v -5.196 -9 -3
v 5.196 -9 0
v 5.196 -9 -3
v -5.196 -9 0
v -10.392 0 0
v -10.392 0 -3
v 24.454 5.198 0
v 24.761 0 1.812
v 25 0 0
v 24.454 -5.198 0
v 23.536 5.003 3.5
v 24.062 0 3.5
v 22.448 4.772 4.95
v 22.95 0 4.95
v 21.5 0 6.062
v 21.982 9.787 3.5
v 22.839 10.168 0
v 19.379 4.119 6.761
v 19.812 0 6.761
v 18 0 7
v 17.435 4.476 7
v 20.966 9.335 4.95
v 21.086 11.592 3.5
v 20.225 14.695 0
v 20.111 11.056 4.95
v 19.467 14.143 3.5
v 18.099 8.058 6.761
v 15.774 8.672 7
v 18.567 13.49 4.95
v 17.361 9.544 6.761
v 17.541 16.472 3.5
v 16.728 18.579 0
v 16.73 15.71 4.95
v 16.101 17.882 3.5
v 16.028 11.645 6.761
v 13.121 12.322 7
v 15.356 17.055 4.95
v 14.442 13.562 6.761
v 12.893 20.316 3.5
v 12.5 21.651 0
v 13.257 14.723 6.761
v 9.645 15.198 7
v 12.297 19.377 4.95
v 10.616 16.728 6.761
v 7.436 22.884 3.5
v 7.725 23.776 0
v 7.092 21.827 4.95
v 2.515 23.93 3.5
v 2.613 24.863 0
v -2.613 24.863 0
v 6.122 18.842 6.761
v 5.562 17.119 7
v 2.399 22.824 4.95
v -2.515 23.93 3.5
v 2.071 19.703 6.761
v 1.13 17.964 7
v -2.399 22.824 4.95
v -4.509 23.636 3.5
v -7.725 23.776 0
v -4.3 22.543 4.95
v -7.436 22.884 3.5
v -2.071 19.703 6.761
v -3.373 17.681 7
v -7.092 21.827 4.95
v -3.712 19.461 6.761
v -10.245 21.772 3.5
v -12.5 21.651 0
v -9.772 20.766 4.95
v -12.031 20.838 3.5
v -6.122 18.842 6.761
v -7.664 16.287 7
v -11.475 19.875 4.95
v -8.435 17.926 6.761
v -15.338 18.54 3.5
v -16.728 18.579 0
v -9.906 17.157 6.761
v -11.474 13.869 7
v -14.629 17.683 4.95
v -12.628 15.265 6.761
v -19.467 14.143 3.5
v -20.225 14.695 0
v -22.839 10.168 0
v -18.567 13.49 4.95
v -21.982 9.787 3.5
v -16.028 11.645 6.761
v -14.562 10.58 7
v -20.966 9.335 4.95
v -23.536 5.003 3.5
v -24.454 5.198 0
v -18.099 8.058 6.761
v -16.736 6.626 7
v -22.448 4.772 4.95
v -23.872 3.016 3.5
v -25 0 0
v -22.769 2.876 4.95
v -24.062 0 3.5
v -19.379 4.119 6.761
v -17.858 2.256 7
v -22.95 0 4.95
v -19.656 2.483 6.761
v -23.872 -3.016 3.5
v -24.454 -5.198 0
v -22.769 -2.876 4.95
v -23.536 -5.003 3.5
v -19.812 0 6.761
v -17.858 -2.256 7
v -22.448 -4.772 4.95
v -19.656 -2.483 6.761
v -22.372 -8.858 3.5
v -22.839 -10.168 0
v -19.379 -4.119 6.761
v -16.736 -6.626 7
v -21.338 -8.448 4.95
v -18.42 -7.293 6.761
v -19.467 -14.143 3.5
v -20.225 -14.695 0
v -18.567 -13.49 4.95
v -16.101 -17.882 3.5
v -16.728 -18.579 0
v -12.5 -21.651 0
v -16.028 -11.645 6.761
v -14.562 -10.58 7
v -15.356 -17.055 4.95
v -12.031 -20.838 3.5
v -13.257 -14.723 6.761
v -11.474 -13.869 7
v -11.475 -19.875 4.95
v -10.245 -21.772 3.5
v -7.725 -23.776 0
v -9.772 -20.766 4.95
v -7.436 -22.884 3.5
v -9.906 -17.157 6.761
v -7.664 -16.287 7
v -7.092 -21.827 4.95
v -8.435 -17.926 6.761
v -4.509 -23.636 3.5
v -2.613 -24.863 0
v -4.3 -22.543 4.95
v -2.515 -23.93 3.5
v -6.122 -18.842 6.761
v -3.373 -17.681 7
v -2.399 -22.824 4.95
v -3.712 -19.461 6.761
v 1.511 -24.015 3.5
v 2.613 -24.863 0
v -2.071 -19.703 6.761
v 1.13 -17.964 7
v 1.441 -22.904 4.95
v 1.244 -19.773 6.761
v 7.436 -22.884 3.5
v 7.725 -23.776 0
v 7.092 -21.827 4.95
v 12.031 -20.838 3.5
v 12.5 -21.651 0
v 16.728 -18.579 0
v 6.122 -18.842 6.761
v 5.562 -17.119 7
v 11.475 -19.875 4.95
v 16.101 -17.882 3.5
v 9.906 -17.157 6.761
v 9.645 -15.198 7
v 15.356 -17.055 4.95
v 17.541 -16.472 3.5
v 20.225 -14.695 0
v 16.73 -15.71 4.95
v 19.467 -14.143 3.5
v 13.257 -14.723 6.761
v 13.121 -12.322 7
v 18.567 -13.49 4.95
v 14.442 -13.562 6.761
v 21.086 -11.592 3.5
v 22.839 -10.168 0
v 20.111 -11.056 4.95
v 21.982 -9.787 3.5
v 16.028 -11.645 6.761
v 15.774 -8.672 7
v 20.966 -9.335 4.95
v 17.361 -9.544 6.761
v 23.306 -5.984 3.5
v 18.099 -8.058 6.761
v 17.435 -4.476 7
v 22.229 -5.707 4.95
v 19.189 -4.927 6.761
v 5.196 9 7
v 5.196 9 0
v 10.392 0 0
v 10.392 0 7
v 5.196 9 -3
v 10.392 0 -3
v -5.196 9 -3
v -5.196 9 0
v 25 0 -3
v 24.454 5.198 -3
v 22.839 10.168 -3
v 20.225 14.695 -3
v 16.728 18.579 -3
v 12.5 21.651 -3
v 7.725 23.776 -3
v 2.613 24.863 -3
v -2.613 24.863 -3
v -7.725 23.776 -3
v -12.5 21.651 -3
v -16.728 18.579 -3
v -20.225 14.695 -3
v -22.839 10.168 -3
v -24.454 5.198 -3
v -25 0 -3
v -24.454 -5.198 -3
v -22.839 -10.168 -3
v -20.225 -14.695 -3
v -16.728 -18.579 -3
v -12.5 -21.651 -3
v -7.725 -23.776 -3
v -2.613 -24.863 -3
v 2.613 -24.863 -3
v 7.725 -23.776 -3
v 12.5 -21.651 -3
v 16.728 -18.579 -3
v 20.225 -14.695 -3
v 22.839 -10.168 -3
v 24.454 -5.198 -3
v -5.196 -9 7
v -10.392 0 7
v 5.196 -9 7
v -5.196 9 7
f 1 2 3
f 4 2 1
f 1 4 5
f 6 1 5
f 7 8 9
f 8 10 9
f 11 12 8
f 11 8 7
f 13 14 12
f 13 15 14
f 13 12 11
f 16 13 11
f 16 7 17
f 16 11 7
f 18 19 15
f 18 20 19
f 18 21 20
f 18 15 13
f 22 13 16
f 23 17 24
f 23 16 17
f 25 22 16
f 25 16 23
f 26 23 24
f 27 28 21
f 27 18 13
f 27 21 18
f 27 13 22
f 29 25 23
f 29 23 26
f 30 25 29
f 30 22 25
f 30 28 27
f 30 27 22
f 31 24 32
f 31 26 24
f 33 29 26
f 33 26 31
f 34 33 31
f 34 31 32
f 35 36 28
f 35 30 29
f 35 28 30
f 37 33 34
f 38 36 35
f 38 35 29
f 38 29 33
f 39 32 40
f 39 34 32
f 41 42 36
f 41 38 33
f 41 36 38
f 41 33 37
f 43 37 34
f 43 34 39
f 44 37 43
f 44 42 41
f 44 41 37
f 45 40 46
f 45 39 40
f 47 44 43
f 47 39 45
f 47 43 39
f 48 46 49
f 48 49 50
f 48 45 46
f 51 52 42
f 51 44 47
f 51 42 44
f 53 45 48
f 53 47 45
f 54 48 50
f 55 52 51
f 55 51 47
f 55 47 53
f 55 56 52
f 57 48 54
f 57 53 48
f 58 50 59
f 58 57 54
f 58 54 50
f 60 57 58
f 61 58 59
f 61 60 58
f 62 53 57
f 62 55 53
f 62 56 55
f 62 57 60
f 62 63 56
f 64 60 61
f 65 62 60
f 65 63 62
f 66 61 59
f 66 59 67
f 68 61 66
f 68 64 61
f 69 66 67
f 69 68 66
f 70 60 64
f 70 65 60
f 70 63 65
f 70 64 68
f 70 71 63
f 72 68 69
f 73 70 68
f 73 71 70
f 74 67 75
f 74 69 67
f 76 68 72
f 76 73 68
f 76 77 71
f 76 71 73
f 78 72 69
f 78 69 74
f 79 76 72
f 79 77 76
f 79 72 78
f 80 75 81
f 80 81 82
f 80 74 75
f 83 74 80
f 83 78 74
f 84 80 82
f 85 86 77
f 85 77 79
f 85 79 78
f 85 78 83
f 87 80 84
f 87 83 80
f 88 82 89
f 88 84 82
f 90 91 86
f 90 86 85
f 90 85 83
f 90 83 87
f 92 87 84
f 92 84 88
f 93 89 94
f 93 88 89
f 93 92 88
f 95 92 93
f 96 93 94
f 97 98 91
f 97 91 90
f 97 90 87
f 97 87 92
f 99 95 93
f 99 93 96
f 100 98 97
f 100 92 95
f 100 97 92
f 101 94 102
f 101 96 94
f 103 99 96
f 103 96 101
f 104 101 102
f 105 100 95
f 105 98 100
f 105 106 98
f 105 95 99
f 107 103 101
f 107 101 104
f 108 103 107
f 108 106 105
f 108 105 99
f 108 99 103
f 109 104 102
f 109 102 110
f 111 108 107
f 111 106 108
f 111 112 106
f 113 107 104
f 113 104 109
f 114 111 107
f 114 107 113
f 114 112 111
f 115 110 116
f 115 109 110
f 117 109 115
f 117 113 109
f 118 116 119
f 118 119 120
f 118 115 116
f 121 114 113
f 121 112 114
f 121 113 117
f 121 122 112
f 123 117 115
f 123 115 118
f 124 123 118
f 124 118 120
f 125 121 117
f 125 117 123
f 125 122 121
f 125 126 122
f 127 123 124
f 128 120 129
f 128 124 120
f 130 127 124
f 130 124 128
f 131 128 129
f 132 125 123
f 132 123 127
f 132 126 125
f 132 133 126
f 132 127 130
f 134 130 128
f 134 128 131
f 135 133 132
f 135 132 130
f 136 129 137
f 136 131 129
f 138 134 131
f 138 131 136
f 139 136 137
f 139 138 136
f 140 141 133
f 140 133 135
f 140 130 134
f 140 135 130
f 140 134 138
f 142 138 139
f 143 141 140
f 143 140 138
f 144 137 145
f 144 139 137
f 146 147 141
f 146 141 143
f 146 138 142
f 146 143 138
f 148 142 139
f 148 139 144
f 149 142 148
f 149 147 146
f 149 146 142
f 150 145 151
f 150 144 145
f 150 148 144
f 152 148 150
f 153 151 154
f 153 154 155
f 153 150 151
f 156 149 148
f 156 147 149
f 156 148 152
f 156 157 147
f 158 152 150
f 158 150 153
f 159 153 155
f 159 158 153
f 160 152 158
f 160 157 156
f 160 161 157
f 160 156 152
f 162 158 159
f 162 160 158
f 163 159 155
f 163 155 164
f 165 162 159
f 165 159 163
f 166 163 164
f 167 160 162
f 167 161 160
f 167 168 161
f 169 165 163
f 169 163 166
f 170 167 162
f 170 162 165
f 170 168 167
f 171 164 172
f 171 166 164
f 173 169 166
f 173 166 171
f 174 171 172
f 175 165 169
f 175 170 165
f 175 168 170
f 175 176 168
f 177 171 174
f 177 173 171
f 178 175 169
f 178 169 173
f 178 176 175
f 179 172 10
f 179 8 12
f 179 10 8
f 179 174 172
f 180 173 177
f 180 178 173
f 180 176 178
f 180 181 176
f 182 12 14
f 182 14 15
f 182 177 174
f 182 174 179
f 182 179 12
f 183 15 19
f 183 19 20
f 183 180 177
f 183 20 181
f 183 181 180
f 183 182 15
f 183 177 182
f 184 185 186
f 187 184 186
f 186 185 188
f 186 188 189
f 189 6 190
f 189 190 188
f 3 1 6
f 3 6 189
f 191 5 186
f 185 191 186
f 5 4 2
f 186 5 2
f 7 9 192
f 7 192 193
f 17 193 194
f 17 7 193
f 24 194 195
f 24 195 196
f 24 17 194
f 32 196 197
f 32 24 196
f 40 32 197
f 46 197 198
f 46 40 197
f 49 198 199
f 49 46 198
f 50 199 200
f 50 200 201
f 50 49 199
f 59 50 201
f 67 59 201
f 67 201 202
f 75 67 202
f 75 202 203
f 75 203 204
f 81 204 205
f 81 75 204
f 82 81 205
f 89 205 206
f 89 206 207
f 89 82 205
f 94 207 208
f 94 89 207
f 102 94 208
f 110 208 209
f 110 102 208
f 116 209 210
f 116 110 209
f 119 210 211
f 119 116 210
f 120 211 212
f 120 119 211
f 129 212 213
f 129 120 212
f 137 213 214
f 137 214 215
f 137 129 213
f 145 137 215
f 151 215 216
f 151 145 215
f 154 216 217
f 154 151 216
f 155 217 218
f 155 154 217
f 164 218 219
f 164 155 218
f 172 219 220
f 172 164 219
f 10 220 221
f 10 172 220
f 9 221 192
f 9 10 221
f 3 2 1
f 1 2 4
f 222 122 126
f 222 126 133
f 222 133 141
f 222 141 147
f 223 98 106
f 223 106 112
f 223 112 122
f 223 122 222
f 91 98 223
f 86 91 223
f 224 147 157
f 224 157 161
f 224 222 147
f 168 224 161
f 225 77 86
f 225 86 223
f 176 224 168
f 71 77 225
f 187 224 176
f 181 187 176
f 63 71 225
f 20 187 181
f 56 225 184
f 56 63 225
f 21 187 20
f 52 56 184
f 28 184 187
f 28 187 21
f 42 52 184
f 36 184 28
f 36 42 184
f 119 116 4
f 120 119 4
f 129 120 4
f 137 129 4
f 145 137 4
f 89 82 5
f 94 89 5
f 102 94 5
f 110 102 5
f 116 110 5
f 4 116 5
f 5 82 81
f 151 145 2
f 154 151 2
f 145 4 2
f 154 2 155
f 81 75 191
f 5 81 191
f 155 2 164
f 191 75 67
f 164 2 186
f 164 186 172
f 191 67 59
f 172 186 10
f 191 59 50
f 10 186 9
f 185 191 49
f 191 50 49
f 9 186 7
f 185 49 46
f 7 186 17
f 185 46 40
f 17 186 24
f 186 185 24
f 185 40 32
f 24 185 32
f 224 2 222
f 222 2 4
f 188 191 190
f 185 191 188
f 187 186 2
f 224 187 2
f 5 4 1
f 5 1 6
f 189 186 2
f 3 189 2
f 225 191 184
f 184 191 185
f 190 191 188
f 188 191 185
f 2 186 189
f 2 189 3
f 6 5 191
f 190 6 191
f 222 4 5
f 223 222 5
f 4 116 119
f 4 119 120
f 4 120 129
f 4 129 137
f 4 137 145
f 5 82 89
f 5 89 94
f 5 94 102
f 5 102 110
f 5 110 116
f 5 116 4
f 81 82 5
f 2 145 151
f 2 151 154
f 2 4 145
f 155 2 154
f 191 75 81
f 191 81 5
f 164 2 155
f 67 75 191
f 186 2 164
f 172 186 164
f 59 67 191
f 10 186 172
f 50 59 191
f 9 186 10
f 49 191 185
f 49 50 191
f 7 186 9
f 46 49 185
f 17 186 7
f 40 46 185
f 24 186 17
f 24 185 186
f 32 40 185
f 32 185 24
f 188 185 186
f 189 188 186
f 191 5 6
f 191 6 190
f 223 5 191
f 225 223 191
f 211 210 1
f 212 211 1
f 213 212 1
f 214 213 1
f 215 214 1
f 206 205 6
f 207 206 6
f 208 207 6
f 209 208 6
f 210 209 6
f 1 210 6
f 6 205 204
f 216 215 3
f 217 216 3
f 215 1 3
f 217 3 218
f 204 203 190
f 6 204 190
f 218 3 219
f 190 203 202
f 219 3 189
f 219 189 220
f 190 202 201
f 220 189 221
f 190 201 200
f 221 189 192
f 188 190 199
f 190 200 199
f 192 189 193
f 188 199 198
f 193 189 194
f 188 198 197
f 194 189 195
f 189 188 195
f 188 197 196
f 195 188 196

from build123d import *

# Parameters (mm, degrees)
F0_R     = 25
F1_DEPTH = 7
F3_DEPTH = 3
F4_DEPTH = 3
F5_R     = 6.99999


# Not quite as in the source:
# - a fillet or chamfer is up to 0.001 mm smaller than in the source, because OpenCascade refuses the exact size


with BuildPart() as f1:
    # F0 (on Top) → F1 (new body)
    with BuildSketch(Plane.XY):
        Circle(F0_R)
        Polygon((-10.3923048454, 0), (-5.1961524227, 9), (0, 9), (5.1961524227, 9), (10.3923048454, 0), (5.1961524227, -9), (-5.1961524227, -9), align=None, mode=Mode.SUBTRACT)
    extrude(amount=F1_DEPTH)


with BuildPart() as f3:
    # F2 (on face) → F3 (new body)
    with BuildSketch(Plane(origin=(0, 0, 0), x_dir=(1, 0, 0), z_dir=(0, 0, -1))):
        Polygon((5.1961524227, 9), (-5.1961524227, 9), (-10.3923048454, 0), (-5.1961524227, -9), (5.1961524227, -9), (10.3923048454, 0), align=None)
    extrude(amount=F3_DEPTH)


with BuildPart() as f4:
    # F4 (new): a face of the model
    f4_faces = [f1.part.faces().sort_by_distance(p)[0] for p in [
        (-24.2928932188, 0, 0),
    ]]
    extrude(f4_faces, amount=F4_DEPTH)


with BuildPart() as f1_1:
    add(f1.part)

    # F5 (radius 7 in the source; OpenCascade refuses exactly that, so slightly less here)
    f5_edges = [f1_1.edges().sort_by_distance(p)[0] for p in [
        (-25, 0, 7),
    ]]
    fillet(f5_edges, radius=F5_R)


solid = Compound([f3.part, f4.part, f1_1.part])
